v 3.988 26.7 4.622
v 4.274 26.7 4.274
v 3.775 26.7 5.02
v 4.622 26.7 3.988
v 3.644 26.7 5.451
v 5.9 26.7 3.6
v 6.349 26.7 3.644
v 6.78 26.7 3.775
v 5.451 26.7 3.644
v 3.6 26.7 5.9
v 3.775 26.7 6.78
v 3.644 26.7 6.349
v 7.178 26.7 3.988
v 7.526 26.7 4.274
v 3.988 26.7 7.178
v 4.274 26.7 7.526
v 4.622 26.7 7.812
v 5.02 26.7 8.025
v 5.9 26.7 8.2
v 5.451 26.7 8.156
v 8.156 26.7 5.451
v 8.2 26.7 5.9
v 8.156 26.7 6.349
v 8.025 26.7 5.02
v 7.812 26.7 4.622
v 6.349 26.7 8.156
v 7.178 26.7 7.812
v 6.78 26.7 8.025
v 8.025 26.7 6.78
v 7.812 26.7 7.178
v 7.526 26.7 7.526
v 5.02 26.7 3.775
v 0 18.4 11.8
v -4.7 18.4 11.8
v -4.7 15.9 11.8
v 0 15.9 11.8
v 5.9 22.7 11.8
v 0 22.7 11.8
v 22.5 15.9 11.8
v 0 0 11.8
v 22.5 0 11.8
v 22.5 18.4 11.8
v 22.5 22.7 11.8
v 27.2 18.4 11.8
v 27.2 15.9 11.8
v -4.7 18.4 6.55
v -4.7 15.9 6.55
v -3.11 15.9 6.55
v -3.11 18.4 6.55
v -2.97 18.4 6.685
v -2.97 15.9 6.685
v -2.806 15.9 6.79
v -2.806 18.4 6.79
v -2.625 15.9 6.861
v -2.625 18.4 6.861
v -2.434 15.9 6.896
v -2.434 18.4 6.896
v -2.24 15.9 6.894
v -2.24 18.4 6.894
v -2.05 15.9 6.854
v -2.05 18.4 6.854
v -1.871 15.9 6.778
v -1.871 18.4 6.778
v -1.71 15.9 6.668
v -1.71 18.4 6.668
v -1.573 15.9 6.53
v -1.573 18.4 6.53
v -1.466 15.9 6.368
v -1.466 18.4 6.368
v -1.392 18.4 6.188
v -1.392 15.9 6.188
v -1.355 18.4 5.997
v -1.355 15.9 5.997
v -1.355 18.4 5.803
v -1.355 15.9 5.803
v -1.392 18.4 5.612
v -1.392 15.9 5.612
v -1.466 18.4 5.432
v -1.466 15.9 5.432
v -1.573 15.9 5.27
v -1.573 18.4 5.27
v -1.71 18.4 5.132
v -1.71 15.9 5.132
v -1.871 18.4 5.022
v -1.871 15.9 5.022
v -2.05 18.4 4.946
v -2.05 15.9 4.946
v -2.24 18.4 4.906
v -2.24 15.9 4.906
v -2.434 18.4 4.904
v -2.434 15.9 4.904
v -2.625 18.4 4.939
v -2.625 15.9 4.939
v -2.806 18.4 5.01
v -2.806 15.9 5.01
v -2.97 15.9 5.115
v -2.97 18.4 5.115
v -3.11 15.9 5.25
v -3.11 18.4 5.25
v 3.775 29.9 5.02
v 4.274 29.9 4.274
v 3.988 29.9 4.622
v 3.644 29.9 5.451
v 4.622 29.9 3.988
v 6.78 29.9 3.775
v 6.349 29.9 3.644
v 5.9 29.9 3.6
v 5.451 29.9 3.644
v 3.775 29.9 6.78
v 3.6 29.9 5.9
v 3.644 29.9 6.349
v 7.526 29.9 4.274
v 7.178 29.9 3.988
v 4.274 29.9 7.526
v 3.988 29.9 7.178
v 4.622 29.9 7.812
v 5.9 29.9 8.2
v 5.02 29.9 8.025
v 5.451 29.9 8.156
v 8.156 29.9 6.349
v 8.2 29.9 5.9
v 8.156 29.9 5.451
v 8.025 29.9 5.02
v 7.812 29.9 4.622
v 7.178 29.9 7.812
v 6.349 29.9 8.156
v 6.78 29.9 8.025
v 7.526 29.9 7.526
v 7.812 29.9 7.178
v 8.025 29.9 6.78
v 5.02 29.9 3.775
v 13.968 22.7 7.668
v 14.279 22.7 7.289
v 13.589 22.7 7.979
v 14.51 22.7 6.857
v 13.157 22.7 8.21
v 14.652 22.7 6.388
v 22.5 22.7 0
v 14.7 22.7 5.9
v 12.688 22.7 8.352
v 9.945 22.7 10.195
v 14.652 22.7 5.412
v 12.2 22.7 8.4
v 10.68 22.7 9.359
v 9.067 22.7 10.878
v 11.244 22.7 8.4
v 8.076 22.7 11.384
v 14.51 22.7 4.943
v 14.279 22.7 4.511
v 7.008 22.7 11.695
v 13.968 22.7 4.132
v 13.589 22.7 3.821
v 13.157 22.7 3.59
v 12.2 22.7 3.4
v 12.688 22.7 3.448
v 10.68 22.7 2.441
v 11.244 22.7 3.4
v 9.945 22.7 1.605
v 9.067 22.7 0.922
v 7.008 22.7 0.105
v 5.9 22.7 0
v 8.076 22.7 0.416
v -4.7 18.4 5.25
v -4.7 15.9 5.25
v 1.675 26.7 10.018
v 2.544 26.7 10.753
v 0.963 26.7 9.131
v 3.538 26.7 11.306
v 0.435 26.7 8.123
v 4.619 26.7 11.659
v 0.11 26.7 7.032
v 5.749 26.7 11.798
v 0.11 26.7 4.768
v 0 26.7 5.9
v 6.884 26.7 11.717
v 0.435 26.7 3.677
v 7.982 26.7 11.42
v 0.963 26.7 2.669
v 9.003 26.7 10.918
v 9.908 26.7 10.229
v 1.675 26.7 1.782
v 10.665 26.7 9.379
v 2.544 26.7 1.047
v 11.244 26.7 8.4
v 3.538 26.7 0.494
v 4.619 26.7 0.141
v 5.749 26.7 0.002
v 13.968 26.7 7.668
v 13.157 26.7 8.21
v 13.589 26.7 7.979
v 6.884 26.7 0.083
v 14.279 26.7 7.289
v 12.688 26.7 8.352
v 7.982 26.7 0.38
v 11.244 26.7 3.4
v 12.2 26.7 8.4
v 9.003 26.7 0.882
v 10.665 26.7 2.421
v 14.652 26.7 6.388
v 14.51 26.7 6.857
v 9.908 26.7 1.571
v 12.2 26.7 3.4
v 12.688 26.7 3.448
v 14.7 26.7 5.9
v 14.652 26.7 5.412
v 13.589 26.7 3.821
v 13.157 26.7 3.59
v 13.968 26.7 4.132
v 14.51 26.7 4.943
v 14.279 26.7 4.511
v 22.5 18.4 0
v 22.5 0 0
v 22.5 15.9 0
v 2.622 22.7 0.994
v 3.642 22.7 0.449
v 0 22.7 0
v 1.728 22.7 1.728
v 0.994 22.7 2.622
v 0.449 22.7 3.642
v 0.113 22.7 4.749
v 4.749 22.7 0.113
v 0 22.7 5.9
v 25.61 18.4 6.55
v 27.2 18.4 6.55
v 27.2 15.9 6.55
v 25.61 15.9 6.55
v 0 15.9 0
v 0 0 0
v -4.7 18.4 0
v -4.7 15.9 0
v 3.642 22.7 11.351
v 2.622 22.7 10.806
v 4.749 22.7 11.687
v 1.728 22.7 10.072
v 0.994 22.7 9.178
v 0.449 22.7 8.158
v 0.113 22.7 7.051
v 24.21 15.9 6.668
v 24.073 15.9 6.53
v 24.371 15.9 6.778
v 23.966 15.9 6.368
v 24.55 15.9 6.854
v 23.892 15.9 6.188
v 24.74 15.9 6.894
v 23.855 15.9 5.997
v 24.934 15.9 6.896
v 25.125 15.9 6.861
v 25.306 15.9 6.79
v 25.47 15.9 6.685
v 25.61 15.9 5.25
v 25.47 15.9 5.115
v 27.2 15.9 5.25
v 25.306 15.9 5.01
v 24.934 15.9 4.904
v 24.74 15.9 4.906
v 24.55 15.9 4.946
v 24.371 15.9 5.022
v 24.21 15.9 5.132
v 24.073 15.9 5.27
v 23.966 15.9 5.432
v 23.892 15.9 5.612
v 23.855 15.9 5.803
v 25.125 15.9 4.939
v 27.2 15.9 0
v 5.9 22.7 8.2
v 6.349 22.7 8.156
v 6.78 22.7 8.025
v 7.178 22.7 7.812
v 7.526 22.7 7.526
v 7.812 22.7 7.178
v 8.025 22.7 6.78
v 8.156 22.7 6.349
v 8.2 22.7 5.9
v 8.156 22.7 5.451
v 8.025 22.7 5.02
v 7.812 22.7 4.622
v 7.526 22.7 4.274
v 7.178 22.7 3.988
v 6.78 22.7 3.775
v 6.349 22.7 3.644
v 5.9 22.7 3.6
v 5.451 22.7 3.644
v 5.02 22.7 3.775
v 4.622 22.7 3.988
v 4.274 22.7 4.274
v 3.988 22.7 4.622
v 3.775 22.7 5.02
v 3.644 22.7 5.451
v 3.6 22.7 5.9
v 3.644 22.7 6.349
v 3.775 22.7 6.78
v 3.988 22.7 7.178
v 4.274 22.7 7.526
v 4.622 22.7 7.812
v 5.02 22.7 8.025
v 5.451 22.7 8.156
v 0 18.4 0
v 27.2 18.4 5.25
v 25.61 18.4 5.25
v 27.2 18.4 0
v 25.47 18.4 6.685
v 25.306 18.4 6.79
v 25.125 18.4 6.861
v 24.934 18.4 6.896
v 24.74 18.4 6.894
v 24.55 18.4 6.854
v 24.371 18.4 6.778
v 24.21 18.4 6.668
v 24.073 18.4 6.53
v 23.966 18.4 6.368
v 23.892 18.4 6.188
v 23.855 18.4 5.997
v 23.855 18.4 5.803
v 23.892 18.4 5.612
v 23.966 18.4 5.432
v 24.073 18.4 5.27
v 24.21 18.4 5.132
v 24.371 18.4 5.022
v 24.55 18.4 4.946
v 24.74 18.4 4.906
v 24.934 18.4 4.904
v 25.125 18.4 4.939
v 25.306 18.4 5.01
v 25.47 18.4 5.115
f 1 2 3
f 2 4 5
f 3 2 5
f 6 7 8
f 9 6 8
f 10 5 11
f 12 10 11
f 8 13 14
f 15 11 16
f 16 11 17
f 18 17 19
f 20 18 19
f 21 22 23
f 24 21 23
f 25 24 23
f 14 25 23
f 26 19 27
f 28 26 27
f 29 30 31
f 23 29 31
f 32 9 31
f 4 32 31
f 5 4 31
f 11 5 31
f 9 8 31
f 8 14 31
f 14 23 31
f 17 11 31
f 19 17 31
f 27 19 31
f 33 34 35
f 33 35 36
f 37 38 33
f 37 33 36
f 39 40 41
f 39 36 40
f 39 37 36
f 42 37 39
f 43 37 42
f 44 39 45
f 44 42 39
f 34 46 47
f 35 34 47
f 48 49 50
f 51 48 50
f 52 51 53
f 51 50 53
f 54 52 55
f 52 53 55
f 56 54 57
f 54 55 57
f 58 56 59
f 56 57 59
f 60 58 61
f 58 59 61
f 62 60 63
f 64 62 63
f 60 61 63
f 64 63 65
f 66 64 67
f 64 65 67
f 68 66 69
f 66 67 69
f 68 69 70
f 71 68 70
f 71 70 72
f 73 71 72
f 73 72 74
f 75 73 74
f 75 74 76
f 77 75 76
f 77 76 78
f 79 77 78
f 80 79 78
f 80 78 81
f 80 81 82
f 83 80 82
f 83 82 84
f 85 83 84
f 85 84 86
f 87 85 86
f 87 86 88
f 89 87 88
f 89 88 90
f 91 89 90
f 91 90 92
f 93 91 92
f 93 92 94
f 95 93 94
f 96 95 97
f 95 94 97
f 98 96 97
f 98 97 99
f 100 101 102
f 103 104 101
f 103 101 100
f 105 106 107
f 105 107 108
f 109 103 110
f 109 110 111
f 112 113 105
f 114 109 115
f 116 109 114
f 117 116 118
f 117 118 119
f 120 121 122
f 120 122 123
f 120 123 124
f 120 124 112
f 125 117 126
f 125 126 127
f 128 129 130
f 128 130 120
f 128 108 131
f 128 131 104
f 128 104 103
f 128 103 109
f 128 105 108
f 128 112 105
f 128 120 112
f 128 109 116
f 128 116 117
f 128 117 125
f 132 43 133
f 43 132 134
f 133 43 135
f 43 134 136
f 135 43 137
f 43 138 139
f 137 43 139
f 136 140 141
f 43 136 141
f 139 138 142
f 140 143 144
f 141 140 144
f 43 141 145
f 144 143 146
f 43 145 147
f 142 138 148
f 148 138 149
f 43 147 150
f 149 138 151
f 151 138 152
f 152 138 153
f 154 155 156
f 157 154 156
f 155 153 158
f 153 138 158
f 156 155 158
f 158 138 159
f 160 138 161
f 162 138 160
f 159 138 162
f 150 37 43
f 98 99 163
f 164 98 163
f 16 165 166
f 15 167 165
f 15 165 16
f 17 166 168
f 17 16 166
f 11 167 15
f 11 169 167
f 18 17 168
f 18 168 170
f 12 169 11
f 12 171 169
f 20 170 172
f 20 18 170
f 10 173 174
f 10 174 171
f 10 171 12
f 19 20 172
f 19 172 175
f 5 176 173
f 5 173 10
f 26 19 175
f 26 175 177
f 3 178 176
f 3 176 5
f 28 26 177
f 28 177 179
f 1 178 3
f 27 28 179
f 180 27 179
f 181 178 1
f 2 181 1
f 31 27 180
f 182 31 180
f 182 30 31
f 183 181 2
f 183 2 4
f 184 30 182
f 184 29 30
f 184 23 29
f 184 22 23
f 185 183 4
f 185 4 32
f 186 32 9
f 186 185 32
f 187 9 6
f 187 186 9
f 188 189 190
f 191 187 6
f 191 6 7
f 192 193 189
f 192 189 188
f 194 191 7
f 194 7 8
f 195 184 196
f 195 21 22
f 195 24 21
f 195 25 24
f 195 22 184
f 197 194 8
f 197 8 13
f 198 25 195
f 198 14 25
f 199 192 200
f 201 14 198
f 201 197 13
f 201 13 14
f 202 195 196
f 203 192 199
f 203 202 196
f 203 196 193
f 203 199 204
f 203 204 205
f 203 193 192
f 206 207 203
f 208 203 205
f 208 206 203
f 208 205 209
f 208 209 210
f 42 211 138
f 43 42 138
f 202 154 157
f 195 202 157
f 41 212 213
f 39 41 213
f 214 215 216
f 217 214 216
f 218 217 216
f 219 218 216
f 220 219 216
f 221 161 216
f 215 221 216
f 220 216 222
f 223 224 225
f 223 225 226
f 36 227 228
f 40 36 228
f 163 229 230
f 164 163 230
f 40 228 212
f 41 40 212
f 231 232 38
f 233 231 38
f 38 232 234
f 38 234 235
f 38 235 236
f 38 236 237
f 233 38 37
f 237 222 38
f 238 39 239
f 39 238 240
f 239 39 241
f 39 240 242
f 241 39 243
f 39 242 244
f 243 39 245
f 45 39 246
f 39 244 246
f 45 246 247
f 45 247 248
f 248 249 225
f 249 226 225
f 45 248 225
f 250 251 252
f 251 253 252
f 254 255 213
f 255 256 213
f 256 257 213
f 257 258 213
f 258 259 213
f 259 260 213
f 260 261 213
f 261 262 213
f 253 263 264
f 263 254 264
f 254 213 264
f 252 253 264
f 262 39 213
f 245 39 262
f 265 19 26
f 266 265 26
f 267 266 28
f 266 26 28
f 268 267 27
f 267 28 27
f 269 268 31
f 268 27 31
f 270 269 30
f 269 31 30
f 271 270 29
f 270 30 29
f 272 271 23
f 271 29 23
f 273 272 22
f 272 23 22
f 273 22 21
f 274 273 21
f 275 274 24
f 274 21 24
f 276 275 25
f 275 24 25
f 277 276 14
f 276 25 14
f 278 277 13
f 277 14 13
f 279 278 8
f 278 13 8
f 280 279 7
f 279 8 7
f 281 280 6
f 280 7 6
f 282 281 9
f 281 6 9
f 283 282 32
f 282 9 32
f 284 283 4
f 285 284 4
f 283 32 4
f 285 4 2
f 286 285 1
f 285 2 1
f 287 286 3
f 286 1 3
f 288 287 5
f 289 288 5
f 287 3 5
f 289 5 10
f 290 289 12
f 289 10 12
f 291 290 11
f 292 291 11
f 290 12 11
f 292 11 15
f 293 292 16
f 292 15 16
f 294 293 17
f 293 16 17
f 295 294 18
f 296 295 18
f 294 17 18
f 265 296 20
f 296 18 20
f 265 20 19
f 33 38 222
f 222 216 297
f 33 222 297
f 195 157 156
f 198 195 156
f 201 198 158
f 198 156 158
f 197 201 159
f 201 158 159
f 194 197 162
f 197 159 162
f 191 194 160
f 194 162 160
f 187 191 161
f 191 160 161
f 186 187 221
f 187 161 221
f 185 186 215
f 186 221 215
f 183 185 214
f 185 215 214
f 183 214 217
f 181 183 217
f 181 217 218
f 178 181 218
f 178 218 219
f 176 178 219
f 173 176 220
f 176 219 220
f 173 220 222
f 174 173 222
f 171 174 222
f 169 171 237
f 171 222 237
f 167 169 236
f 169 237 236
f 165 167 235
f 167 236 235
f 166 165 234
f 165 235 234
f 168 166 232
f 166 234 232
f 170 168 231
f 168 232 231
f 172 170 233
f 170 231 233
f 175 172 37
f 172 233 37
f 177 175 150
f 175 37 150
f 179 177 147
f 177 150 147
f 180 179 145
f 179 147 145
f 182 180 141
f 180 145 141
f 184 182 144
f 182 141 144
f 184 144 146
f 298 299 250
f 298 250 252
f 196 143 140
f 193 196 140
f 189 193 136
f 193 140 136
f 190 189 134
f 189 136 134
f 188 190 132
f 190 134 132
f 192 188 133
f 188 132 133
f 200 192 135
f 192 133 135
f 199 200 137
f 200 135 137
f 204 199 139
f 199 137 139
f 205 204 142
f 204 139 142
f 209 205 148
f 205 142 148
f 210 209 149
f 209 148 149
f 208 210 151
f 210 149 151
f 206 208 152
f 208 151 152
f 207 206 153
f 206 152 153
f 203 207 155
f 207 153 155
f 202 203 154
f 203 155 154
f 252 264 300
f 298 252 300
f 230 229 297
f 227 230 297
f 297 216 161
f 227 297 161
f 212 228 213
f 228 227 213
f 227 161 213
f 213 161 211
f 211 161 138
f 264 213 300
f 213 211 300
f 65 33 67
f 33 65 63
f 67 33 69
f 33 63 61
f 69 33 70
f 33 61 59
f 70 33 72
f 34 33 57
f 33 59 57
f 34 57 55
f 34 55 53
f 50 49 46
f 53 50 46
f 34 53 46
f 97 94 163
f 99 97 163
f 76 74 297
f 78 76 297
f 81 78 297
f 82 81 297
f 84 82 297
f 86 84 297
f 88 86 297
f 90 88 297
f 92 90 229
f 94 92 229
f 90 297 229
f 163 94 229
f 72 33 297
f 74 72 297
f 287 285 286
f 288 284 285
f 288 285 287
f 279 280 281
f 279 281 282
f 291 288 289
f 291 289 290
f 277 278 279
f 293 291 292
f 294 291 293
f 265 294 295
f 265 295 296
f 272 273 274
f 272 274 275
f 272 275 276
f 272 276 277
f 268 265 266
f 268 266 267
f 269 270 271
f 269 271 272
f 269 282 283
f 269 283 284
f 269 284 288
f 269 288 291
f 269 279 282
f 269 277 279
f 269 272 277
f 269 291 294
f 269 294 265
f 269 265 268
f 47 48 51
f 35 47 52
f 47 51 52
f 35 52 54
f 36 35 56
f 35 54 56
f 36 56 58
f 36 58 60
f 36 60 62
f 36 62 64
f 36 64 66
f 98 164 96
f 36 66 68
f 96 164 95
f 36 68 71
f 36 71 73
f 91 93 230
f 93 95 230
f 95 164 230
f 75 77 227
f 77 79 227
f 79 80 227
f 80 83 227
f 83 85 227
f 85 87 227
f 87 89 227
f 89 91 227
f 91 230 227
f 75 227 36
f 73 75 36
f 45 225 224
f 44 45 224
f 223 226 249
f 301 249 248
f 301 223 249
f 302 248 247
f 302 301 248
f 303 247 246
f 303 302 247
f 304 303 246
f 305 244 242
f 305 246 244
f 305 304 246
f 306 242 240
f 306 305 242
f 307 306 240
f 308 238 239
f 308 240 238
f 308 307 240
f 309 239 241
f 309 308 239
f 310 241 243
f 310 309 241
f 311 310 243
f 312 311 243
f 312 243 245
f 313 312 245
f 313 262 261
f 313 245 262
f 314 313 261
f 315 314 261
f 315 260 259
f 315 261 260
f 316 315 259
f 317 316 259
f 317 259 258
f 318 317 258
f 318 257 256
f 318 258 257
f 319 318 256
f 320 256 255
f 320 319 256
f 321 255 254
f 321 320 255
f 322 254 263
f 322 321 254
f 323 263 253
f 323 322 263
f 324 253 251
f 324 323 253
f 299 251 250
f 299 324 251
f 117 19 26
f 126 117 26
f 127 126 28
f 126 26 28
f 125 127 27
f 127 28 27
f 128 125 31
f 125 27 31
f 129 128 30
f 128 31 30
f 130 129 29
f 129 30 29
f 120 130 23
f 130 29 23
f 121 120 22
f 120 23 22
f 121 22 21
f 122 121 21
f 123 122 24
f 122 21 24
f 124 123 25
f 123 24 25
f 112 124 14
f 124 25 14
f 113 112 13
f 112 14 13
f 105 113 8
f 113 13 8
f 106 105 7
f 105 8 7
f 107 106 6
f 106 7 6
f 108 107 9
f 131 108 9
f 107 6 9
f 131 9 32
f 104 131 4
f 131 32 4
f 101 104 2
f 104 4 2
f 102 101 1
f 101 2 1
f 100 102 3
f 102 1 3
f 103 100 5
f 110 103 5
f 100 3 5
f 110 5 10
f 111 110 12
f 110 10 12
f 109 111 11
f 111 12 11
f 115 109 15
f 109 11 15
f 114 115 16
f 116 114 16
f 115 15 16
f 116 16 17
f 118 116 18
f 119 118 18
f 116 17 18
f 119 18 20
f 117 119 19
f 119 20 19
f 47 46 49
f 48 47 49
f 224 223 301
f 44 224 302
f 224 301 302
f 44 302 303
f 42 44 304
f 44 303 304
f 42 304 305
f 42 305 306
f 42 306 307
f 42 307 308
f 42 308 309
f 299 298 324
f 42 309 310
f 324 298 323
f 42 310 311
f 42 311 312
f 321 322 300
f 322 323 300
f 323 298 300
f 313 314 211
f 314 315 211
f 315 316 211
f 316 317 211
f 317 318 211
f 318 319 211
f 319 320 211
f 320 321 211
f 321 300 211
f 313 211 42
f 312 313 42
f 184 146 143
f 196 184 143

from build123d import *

# Parameters (mm, degrees)
BOSS_EXTRUDE1_DEPTH = 11.8
BOSS_EXTRUDE2_DEPTH = 4
SKETCH3_R           = 2.3
CUT_EXTRUDE1_DEPTH  = 4
CUT_EXTRUDE2_DEPTH  = 4
SKETCH5_R           = 2.3
BOSS_EXTRUDE3_DEPTH = 3.2


with BuildPart() as part:
    # Sketch1 → Boss-Extrude1 (new body)
    with BuildSketch(Plane.XY):
        Polygon((0, 0), (22.5, 0), (22.5, 15.9), (27.2, 15.9), (27.2, 18.4), (22.5, 18.4), (22.5, 22.7), (0, 22.7), (0, 18.4), (-4.7, 18.4), (-4.7, 15.9), (0, 15.9), align=None)
    extrude(amount=BOSS_EXTRUDE1_DEPTH)

    # Sketch2 → Boss-Extrude2 (add)
    with BuildSketch(Plane(origin=(0, 22.7, 0), x_dir=(1, 0, 0), z_dir=(0, 1, 0))):
        with BuildLine():
            Line((12.2, -3.4), (11.244155686, -3.4))
            ThreePointArc((11.244155686, -3.4), (0, -5.9), (11.244155686, -8.4))
            Line((11.244155686, -8.4), (12.2, -8.4))
            ThreePointArc((12.2, -8.4), (14.7, -5.9), (12.2, -3.4))
        make_face()
    extrude(amount=BOSS_EXTRUDE2_DEPTH)

    # Sketch3 → Cut-Extrude1 (cut)
    with BuildSketch(Plane(origin=(0, 26.7, 0), x_dir=(1, 0, 0), z_dir=(0, 1, 0))):
        with Locations(Location((5.9, -5.9, 0), (0, 0, 270))):
            Circle(SKETCH3_R)
    extrude(amount=-CUT_EXTRUDE1_DEPTH, mode=Mode.SUBTRACT)

    # Sketch4 → Cut-Extrude2 (cut)
    with BuildSketch(Plane(origin=(0, 18.4, 0), x_dir=(1, 0, 0), z_dir=(0, 1, 0))):
        with BuildLine():
            Line((-4.7, -5.25), (-4.7, -6.55))
            Line((-4.7, -6.55), (-3.109934208, -6.55))
            ThreePointArc((-3.109934208, -6.55), (-1.35, -5.9), (-3.109934208, -5.25))
            Line((-3.109934208, -5.25), (-4.7, -5.25))
        make_face()
    cut_extrude2 = extrude(amount=-CUT_EXTRUDE2_DEPTH, mode=Mode.SUBTRACT)

    # Mirror1: Cut-Extrude2 across plane
    add(cut_extrude2.mirror(Plane(origin=(11.25, 0, 0), x_dir=(0, 0, 1), z_dir=(1, 0, 0))), mode=Mode.SUBTRACT)


with BuildPart() as body_2:
    # Sketch5 → Boss-Extrude3 (new body)
    with BuildSketch(Plane(origin=(0, 26.7, 0), x_dir=(1, 0, 0), z_dir=(0, 1, 0))):
        with Locations(Location((5.9, -5.9, 0), (0, 0, 270))):
            Circle(SKETCH5_R)
    extrude(amount=BOSS_EXTRUDE3_DEPTH)


solid = Compound([part.part, body_2.part])
